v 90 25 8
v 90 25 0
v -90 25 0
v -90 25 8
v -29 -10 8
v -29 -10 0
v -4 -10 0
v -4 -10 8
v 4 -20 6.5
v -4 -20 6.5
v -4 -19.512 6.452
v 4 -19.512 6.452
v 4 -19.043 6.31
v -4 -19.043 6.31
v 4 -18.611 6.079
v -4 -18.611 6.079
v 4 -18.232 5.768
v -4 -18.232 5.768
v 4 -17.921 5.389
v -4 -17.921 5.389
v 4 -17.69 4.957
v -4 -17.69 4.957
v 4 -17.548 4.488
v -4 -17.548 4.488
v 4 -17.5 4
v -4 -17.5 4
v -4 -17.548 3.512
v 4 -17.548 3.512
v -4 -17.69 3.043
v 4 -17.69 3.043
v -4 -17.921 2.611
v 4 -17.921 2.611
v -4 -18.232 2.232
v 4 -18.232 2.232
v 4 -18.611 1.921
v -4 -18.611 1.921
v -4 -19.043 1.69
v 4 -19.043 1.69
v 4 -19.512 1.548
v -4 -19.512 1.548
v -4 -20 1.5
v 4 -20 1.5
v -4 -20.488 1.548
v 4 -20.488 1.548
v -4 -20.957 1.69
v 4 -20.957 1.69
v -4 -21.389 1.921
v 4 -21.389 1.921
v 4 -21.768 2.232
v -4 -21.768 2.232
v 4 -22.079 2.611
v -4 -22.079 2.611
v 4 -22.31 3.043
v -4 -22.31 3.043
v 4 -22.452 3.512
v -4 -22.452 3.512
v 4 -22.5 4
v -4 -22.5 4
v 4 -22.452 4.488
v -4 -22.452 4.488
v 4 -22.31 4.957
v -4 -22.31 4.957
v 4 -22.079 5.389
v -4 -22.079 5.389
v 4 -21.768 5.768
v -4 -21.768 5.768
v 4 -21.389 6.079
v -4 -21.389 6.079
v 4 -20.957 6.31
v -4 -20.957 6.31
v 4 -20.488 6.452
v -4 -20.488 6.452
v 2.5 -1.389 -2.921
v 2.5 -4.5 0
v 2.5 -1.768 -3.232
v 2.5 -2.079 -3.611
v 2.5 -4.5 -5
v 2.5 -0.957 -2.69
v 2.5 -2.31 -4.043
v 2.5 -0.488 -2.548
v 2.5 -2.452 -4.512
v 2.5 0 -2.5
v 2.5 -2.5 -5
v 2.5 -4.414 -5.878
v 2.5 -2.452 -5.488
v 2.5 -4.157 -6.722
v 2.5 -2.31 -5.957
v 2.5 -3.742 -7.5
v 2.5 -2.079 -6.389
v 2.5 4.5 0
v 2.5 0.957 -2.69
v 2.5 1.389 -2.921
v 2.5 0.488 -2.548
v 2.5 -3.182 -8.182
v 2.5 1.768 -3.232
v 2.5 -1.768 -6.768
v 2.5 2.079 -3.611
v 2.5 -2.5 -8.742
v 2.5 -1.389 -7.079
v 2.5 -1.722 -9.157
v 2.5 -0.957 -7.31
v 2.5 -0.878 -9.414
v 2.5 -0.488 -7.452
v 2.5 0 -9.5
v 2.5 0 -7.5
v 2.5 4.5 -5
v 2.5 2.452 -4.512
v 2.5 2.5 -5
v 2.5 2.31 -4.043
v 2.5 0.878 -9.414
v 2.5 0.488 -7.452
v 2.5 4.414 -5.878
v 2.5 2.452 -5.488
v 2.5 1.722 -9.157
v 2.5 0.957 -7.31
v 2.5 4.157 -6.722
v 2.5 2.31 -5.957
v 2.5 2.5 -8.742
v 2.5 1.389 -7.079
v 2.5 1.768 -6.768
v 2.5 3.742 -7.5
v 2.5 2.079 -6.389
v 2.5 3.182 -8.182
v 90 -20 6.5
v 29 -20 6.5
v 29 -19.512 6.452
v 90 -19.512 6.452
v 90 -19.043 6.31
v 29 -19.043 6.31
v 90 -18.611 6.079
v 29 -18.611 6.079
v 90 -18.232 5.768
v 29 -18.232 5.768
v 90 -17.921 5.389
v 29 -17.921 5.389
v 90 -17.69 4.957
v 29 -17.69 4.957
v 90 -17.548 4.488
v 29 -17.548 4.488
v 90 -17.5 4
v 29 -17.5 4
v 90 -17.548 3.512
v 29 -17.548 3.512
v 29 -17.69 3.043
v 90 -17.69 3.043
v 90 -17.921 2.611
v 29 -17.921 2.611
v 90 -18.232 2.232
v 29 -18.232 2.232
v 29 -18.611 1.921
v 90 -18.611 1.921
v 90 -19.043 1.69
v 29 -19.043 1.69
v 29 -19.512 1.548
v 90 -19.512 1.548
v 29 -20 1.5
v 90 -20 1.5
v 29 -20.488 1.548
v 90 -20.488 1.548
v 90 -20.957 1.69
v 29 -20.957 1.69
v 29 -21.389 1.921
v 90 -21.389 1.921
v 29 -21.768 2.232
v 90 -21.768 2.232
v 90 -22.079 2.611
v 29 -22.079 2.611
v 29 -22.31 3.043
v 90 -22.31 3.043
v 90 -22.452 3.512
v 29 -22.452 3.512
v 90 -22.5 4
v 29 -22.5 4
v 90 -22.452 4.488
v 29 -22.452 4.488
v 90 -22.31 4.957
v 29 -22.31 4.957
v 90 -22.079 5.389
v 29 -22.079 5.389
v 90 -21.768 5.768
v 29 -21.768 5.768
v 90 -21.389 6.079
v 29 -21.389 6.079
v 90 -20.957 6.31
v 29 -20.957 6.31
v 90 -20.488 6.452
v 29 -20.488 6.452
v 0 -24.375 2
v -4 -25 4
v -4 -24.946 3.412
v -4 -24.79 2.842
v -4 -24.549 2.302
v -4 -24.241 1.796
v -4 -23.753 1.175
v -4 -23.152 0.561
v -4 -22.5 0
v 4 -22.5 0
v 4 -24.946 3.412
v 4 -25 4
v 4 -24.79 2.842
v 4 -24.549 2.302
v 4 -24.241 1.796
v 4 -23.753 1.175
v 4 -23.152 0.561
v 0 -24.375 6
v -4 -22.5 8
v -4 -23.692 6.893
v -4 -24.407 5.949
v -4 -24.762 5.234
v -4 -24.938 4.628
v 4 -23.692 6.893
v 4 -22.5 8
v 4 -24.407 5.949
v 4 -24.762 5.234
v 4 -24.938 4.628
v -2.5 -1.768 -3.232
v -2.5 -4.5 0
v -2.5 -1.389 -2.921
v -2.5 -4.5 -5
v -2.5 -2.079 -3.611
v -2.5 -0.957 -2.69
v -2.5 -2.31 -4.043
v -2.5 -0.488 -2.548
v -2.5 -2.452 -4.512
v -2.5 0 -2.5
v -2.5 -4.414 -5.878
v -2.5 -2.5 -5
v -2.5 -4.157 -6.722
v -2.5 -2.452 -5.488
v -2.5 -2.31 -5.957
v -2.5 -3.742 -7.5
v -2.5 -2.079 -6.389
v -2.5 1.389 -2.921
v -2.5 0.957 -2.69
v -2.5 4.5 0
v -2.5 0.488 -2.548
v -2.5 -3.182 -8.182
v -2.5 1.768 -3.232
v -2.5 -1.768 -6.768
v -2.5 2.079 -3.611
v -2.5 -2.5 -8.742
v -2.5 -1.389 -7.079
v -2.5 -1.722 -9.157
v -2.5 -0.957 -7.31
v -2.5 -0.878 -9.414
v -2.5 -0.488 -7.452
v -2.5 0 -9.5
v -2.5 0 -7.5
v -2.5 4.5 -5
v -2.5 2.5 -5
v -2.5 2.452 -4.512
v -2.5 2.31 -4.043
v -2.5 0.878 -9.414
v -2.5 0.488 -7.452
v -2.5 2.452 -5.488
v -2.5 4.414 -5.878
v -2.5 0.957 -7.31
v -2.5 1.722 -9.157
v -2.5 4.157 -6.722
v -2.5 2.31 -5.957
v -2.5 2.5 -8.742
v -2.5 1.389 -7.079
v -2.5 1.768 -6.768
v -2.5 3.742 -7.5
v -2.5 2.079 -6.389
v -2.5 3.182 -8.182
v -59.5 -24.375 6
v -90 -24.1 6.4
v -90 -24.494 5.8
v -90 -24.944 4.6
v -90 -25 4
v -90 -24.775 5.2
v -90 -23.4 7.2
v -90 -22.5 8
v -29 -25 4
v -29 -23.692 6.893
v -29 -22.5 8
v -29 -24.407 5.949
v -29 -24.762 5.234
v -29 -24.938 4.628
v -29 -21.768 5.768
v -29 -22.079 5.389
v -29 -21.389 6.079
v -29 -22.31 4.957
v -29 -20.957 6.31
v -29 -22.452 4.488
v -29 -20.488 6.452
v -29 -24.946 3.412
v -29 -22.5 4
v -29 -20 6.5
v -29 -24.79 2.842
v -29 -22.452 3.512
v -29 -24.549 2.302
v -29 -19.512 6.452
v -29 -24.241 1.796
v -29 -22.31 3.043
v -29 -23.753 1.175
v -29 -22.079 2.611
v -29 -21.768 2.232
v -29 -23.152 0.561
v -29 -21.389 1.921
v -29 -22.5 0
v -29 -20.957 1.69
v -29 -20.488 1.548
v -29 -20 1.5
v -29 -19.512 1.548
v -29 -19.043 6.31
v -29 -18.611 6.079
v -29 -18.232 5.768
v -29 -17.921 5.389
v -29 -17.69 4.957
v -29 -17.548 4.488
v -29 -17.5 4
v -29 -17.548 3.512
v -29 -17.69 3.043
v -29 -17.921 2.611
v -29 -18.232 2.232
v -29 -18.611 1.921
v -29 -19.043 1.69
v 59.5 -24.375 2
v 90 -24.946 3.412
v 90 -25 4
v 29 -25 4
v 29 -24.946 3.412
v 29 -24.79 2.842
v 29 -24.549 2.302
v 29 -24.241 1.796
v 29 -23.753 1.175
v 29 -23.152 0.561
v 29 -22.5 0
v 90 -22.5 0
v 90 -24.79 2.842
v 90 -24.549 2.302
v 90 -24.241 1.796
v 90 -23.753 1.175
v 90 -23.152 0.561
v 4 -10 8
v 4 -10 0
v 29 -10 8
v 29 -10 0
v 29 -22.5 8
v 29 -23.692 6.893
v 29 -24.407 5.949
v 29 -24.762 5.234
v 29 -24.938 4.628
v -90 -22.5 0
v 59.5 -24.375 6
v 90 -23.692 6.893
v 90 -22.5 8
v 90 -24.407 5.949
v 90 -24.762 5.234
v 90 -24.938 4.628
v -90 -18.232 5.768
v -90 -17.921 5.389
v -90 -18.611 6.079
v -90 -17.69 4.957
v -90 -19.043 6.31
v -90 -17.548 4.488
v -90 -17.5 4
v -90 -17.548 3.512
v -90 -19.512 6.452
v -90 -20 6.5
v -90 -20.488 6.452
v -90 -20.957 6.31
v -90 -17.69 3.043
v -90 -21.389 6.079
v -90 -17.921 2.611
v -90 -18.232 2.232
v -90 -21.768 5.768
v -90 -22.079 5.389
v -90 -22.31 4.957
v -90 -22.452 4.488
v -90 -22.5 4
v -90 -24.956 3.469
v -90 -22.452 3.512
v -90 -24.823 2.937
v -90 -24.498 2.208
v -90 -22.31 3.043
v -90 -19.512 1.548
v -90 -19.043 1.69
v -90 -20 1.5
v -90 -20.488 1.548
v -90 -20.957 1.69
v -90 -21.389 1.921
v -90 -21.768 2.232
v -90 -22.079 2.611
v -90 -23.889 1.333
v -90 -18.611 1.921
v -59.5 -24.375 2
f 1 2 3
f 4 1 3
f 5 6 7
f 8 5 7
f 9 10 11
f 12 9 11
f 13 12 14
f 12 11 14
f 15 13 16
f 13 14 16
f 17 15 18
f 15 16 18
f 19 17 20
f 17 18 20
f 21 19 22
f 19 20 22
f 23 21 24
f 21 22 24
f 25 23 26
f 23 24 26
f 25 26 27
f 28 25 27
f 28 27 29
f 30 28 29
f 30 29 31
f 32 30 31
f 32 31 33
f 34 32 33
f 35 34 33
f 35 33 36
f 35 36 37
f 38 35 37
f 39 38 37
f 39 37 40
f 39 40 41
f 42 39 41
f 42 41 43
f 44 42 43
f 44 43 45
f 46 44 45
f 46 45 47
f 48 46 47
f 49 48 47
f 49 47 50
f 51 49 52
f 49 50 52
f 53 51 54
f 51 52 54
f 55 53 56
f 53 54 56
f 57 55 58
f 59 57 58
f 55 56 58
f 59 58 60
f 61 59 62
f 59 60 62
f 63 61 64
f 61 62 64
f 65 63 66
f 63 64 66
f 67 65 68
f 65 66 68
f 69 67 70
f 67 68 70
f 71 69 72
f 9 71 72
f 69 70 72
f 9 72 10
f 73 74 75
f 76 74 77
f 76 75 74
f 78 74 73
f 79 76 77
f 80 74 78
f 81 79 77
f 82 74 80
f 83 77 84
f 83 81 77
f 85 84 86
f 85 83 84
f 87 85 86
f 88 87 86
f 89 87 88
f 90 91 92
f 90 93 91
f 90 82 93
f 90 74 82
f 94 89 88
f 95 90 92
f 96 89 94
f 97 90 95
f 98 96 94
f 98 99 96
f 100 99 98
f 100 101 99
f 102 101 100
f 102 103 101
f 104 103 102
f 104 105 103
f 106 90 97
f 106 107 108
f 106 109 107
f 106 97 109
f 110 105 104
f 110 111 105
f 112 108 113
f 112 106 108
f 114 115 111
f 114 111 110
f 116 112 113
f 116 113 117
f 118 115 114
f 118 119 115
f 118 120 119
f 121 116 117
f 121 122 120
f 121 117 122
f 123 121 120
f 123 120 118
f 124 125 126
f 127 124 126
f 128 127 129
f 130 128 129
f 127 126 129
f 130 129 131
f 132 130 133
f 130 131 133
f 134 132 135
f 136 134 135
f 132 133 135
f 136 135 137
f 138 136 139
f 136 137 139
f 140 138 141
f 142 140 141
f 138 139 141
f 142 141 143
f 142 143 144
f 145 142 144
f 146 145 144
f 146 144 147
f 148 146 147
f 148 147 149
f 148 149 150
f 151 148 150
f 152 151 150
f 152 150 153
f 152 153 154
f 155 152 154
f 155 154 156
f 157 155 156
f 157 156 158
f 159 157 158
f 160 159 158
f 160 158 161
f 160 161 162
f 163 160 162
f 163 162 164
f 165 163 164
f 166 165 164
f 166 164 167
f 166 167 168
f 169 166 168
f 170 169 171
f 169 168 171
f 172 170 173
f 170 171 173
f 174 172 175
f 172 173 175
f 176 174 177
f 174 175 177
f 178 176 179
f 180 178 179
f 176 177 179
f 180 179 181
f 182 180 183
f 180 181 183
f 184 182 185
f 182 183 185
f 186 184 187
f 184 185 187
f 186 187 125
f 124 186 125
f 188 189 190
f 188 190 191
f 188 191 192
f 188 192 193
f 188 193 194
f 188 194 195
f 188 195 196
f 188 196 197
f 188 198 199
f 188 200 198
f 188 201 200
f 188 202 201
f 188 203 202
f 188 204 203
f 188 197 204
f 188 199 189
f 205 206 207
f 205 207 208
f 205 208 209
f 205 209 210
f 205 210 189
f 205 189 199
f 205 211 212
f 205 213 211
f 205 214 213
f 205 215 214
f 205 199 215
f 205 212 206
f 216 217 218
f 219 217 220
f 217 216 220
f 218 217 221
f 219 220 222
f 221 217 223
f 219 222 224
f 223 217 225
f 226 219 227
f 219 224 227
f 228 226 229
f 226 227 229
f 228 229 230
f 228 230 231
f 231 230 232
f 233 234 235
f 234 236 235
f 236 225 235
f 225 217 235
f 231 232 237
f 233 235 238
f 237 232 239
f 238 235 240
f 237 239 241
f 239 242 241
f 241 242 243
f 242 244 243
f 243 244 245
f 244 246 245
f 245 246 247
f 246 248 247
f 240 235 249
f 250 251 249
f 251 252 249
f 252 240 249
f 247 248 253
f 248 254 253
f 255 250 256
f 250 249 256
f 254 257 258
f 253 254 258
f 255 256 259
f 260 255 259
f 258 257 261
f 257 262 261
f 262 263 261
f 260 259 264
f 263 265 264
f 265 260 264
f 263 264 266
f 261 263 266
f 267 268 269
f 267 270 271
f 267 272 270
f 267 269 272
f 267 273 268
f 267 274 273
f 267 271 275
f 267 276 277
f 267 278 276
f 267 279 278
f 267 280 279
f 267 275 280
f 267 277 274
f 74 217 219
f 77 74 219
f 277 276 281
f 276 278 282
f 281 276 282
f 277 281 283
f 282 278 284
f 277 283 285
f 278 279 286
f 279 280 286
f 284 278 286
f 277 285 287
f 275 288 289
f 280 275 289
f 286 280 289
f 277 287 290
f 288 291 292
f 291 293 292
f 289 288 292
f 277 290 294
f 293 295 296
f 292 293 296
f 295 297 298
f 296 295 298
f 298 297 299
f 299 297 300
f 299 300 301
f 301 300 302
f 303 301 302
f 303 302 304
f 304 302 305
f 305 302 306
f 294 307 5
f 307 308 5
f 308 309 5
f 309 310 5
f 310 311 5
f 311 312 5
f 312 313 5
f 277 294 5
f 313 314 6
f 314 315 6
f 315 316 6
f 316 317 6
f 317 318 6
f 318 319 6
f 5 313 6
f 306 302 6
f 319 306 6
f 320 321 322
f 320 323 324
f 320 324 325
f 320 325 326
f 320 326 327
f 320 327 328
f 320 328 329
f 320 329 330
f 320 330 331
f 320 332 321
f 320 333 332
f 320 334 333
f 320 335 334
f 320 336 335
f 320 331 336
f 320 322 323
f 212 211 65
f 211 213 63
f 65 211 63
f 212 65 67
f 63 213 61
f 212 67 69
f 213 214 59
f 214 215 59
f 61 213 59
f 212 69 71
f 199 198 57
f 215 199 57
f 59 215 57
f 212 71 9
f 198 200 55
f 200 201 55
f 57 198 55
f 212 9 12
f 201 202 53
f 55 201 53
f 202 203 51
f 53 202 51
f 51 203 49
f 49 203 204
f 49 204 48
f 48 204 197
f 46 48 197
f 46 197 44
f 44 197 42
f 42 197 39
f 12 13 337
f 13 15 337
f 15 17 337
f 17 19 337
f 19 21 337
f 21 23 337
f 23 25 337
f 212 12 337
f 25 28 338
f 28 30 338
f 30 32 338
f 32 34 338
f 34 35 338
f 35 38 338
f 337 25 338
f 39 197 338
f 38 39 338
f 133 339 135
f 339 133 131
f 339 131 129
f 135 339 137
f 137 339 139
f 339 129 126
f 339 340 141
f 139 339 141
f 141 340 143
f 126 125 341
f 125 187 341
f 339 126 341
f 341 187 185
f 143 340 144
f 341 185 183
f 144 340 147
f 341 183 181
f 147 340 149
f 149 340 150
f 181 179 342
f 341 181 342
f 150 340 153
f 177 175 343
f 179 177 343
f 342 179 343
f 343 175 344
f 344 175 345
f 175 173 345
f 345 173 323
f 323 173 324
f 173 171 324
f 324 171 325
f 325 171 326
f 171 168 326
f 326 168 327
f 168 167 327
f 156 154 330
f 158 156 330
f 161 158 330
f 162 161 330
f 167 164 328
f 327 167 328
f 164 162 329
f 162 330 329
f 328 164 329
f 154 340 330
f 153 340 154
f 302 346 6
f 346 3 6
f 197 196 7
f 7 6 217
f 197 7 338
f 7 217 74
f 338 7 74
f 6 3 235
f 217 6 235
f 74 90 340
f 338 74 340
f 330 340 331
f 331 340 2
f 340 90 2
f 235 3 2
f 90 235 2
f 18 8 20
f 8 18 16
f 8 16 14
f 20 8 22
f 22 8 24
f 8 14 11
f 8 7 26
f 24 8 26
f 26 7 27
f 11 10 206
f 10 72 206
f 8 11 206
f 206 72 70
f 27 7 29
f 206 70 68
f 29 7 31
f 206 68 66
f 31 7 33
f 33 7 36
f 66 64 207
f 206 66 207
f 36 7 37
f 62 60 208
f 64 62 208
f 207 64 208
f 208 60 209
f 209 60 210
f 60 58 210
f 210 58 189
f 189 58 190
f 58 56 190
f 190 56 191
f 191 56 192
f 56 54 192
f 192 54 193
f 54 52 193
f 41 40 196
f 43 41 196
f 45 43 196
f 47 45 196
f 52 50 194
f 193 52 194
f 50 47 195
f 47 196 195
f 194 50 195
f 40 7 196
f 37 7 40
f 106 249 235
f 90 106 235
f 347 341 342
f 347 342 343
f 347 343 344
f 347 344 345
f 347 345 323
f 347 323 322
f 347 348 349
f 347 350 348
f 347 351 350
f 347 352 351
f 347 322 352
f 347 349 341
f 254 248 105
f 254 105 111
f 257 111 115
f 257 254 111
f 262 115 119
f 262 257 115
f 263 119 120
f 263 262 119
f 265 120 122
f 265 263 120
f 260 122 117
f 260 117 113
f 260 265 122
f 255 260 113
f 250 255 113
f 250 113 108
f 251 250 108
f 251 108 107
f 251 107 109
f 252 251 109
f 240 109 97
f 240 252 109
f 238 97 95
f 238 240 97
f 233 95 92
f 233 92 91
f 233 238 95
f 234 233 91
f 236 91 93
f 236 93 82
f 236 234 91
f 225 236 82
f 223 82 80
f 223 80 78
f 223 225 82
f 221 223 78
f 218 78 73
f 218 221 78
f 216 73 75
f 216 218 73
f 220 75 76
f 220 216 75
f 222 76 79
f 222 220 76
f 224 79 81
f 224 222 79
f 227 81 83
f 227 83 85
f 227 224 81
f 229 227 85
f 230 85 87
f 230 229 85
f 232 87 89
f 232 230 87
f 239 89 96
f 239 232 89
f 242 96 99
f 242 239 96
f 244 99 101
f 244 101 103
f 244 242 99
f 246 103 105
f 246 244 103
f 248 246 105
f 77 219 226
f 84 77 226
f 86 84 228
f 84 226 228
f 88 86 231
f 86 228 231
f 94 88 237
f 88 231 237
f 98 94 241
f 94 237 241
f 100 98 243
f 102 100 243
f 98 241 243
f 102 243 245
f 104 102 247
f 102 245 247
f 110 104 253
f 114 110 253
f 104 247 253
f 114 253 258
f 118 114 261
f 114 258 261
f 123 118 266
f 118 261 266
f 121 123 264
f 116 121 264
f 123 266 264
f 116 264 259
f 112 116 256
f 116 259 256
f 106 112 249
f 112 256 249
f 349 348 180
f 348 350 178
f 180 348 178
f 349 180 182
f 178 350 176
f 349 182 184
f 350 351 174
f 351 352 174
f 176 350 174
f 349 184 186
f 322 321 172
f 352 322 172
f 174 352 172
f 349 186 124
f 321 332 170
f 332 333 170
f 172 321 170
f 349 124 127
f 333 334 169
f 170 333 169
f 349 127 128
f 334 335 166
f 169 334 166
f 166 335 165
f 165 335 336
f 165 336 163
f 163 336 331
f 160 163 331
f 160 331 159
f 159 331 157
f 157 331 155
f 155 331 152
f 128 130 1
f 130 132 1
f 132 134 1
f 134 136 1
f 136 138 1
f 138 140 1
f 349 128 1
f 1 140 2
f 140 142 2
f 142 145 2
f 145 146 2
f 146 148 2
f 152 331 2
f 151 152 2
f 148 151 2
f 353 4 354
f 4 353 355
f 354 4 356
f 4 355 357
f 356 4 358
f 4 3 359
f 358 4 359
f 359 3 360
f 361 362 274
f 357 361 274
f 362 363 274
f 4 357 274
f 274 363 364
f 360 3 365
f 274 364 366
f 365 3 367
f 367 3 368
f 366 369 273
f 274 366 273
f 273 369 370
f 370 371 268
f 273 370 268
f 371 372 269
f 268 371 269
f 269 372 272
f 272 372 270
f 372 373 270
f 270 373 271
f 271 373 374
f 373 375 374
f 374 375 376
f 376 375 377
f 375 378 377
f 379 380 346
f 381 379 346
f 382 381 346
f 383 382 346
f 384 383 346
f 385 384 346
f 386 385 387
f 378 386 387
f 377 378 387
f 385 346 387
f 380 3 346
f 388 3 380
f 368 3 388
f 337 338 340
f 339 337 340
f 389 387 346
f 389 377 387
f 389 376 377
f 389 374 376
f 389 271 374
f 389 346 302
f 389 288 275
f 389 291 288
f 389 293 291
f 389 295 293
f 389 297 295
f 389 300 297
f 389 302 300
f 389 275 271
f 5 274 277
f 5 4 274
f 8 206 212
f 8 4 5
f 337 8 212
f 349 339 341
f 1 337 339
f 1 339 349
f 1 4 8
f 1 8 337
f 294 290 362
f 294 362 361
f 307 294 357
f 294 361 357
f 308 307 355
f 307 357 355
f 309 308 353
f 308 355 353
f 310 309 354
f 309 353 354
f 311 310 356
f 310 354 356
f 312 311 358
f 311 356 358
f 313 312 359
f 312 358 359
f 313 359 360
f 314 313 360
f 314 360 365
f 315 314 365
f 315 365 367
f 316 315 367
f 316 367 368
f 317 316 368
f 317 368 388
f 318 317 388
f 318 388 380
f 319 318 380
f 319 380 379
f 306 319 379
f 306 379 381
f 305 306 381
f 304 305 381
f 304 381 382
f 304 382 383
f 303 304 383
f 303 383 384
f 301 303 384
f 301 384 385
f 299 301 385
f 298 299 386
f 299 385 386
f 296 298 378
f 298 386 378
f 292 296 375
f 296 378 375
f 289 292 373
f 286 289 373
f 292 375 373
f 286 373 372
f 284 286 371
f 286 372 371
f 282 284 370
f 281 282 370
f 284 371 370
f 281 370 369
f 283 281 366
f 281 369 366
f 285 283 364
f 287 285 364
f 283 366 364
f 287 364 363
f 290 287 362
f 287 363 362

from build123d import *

# Parameters (mm, degrees)
BOSS_EXTRU_1_DEPTH      = 8
ENL_V_MAT_EXTRU_1_REACH = 183.904
ESQUISSE2_R             = 2.5
BOSS_EXTRU_2_DEPTH      = 2.5
BOSS_EXTRU_2_DEPTH_BACK = 2.5
ESQUISSE4_R             = 2.5


with BuildPart() as part:
    # Esquisse1 → Boss.-Extru.1 (new body)
    with BuildSketch(Plane.XY):
        Polygon((-29, -25), (-29, -10), (-4, -10), (-4, -25), (4, -25), (4, -10), (29, -10), (29, -25), (90, -25), (90, 25), (-90, 25), (-90, -25), align=None)
    extrude(amount=BOSS_EXTRU_1_DEPTH)

    # Enlèv. mat.-Extru.1: up to this face of the body (flat: up to its plane)
    enl_v_mat_extru_1_end = Plane(part.part.faces().sort_by_distance((90, 0, 4))[0])
    # Esquisse2 → Enlèv. mat.-Extru.1 (cut, up to the picked face)
    with BuildSketch(Plane.ZY.offset(90), mode=Mode.PRIVATE) as enl_v_mat_extru_1_sk1:
        with BuildLine():
            add(Edge.make_bspline(
                [(4, -25), (6, -25), (8, -22.5)],
                knots=[0.5, 0.5, 0.5, 1, 1, 1], degree=2))
            Line((4, -25), (8, -25))
            Line((8, -25), (8, -22.5))
        make_face()
    enl_v_mat_extru_1_tool1 = split(extrude(enl_v_mat_extru_1_sk1.sketch, amount=-ENL_V_MAT_EXTRU_1_REACH, mode=Mode.PRIVATE), bisect_by=enl_v_mat_extru_1_end, keep=Keep.BOTH, mode=Mode.PRIVATE)
    # Esquisse2 → Enlèv. mat.-Extru.1 (cut, up to the picked face)
    with BuildSketch(Plane.ZY.offset(90), mode=Mode.PRIVATE) as enl_v_mat_extru_1_sk2:
        with BuildLine():
            add(Edge.make_bspline(
                [(0, -22.5), (2, -25), (4, -25)],
                knots=[0, 0, 0, 0.5, 0.5, 0.5], degree=2))
            Line((0, -22.5), (0, -25))
            Line((0, -25), (4, -25))
        make_face()
    enl_v_mat_extru_1_tool2 = split(extrude(enl_v_mat_extru_1_sk2.sketch, amount=-ENL_V_MAT_EXTRU_1_REACH, mode=Mode.PRIVATE), bisect_by=enl_v_mat_extru_1_end, keep=Keep.BOTH, mode=Mode.PRIVATE)
    # Esquisse2 → Enlèv. mat.-Extru.1 (cut, up to the picked face)
    with BuildSketch(Plane.ZY.offset(90), mode=Mode.PRIVATE) as enl_v_mat_extru_1_sk3:
        with Locations((4, -20)):
            Circle(ESQUISSE2_R)
    enl_v_mat_extru_1_tool3 = split(extrude(enl_v_mat_extru_1_sk3.sketch, amount=-ENL_V_MAT_EXTRU_1_REACH, mode=Mode.PRIVATE), bisect_by=enl_v_mat_extru_1_end, keep=Keep.BOTH, mode=Mode.PRIVATE)
    add(enl_v_mat_extru_1_tool1.solids().sort_by(Axis((-90, -24.25, 7), (1, 0, 0)))[0], mode=Mode.SUBTRACT)
    add(enl_v_mat_extru_1_tool2.solids().sort_by(Axis((-90, -24.25, 1), (1, 0, 0)))[0], mode=Mode.SUBTRACT)
    add(enl_v_mat_extru_1_tool3.solids().sort_by(Axis((-90, -20, 4), (1, 0, 0)))[0], mode=Mode.SUBTRACT)

    # Esquisse4 → Boss.-Extru.2 (add, two sides: drawn at the far end of the back side and taken through both)
    with BuildSketch(Plane(origin=(0, 0, 0), x_dir=(0, 0, -1), z_dir=(1, 0, 0)).offset(-BOSS_EXTRU_2_DEPTH_BACK)):
        with BuildLine():
            Line((5, 4.5), (0, 4.5))
            Line((0, 4.5), (0, -4.5))
            Line((0, -4.5), (5, -4.5))
            ThreePointArc((5, -4.5), (9.5, 0), (5, 4.5))
        make_face()
        with Locations((5, 0)):
            Circle(ESQUISSE4_R, mode=Mode.SUBTRACT)
    extrude(amount=BOSS_EXTRU_2_DEPTH + BOSS_EXTRU_2_DEPTH_BACK)


solid = part.part
